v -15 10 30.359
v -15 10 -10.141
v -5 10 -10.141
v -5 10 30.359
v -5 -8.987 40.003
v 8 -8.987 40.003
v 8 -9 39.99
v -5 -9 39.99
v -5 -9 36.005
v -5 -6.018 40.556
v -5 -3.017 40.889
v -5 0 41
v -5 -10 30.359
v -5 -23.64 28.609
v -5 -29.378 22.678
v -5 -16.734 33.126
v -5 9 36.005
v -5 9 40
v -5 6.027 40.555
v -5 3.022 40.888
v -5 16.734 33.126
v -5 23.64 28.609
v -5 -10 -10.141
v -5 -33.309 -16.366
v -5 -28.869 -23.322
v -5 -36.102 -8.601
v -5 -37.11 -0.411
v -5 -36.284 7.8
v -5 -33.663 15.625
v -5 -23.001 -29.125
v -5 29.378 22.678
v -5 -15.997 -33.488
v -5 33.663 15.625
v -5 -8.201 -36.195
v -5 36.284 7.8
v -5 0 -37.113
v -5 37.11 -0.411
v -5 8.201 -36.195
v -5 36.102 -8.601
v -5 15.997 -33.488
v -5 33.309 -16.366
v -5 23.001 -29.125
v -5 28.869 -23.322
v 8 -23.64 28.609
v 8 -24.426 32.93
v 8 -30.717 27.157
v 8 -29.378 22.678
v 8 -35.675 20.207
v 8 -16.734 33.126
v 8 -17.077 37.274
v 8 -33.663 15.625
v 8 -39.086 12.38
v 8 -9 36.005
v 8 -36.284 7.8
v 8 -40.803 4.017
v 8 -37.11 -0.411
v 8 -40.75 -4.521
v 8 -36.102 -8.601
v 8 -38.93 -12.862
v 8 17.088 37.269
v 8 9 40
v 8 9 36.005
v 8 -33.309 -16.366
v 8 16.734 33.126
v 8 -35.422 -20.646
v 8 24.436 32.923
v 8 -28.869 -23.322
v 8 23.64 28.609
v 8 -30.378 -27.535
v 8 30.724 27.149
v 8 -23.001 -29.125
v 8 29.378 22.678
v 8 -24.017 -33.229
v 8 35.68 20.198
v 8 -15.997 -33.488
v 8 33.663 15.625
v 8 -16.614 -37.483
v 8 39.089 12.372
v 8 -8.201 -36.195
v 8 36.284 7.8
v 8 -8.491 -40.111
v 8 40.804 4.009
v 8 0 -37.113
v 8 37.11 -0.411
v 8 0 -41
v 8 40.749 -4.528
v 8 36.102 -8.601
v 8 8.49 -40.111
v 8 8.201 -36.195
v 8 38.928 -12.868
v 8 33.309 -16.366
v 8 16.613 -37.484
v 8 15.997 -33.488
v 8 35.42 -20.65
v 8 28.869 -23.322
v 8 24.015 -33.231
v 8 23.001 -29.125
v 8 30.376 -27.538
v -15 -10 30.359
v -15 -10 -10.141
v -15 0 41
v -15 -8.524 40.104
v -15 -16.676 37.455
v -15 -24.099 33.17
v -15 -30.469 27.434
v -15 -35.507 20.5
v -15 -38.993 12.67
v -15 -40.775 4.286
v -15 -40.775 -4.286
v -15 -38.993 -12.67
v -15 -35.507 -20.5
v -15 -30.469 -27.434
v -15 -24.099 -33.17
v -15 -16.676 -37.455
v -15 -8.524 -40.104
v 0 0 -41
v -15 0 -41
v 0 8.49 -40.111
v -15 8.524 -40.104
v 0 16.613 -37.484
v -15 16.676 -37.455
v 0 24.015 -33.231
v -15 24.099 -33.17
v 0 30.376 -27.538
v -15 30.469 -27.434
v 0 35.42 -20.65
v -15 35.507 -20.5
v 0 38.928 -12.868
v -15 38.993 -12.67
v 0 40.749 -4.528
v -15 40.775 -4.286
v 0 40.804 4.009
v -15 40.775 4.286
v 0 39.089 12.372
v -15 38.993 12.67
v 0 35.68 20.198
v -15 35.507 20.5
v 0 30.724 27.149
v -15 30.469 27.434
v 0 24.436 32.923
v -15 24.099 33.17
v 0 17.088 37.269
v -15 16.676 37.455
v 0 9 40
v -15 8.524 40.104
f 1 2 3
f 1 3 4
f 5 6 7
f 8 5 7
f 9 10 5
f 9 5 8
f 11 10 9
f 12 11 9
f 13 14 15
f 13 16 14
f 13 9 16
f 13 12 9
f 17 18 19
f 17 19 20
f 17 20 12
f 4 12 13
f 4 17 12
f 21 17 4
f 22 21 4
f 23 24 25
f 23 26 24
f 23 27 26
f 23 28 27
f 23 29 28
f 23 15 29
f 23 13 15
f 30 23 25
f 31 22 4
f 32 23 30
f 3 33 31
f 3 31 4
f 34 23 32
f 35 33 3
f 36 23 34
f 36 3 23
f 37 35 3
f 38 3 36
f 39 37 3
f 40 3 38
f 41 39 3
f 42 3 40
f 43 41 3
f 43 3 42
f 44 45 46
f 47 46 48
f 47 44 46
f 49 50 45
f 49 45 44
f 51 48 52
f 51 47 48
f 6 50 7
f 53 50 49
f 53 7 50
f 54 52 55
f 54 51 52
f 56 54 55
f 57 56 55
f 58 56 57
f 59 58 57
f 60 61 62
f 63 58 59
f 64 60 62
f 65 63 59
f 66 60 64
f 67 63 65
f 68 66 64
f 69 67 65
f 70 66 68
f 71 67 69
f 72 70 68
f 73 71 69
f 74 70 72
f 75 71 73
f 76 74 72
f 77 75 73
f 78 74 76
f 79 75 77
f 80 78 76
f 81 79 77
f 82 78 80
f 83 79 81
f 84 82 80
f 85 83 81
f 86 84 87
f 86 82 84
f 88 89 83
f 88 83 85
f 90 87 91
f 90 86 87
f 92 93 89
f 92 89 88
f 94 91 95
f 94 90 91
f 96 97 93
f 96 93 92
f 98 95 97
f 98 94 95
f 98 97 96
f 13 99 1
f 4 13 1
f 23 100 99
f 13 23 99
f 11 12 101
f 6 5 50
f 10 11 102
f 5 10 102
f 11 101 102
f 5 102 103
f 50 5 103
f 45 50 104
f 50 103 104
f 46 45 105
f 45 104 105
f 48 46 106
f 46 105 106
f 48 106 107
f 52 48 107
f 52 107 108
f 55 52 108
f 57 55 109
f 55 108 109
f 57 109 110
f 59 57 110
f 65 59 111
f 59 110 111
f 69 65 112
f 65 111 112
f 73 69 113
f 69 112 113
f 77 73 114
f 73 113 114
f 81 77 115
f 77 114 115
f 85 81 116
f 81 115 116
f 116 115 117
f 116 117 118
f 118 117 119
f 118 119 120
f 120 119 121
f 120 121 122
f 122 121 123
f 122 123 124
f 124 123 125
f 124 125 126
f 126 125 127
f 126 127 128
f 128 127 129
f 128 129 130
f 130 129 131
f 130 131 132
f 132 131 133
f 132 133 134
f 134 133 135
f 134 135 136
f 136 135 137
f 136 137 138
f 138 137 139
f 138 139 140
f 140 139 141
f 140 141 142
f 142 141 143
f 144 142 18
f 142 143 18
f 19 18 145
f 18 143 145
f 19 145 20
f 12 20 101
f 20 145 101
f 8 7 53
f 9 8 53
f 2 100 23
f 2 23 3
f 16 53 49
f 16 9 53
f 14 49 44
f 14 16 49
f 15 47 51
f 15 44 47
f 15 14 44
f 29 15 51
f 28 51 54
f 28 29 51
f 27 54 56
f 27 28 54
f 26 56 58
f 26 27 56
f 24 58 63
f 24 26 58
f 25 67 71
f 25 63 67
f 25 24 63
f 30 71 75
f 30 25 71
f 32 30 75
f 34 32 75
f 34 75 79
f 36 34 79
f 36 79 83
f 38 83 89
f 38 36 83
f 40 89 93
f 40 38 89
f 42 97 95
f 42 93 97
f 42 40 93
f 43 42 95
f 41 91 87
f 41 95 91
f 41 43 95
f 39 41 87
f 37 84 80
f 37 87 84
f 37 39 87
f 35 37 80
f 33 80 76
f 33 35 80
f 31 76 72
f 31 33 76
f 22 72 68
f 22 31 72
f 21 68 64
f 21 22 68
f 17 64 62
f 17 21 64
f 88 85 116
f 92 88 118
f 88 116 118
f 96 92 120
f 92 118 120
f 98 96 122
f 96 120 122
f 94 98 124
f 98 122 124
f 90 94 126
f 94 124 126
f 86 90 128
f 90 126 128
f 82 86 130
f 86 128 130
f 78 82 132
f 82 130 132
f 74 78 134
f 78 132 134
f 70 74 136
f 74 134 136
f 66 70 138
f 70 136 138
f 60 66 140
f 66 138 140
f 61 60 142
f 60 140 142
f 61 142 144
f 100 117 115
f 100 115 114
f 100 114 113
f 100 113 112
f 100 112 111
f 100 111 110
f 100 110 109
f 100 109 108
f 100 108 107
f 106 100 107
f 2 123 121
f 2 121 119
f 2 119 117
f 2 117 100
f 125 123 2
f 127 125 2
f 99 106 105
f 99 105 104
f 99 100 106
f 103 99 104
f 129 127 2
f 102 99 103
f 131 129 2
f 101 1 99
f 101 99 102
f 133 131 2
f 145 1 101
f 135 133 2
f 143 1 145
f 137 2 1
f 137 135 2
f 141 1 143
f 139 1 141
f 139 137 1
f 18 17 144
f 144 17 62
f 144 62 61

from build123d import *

# Parameters (mm, degrees)
CROQUIS1_R              = 41
CROQUIS1_R_2            = 37.1125
SALIENTE_EXTRUIR1_DEPTH = 10
CROQUIS2_R              = 41
SALIENTE_EXTRUIR2_DEPTH = 10
CROQUIS3_R              = 29.25
CROQUIS3_R_2            = 23.25
CORTAR_EXTRUIR3_DEPTH   = 5
CROQUIS6_R              = 41
SALIENTE_EXTRUIR4_DEPTH = 5
CROQUIS8_R              = 41
CROQUIS8_R_2            = 34.6125
SALIENTE_EXTRUIR9_DEPTH = 2
CROQUIS10_W             = 40.5
CROQUIS10_H             = 20
CORTAR_EXTRUIR5_DEPTH   = 25
CROQUIS11_R             = 41
CROQUIS11_R_2           = 34.6125
CORTAR_EXTRUIR7_DEPTH   = 2
CROQUIS16_R             = 37.1125
CROQUIS16_R_2           = 29.25
CROQUIS16_R_3           = 23.25
CROQUIS16_R_4           = 0.131738941
CORTAR_EXTRUIR8_DEPTH   = 5
CORTAR_EXTRUIR11_DEPTH  = 13


with BuildPart() as part:
    # Croquis1 → Saliente-Extruir1 (new body)
    with BuildSketch(Plane(origin=(0, 0, 0), x_dir=(0, 0, -1), z_dir=(1, 0, 0))):
        Circle(CROQUIS1_R)
        Circle(CROQUIS1_R_2, mode=Mode.SUBTRACT)
    extrude(amount=SALIENTE_EXTRUIR1_DEPTH)

    # Croquis2 → Saliente-Extruir2 (add)
    with BuildSketch(Plane.ZY):
        Circle(CROQUIS2_R)
    extrude(amount=SALIENTE_EXTRUIR2_DEPTH)

    # Croquis3 → Cortar-Extruir3 (cut)
    with BuildSketch(Plane(origin=(0, 0, 0), x_dir=(0, 0, -1), z_dir=(1, 0, 0))):
        Circle(CROQUIS3_R)
        Circle(CROQUIS3_R_2, mode=Mode.SUBTRACT)
    extrude(amount=-CORTAR_EXTRUIR3_DEPTH, mode=Mode.SUBTRACT)

    # Croquis6 → Saliente-Extruir4 (add)
    with BuildSketch(Plane.ZY.offset(10)):
        Circle(CROQUIS6_R)
    extrude(amount=SALIENTE_EXTRUIR4_DEPTH)

    # Croquis8 → Saliente-Extruir9 (add)
    with BuildSketch(Plane(origin=(10, 0, 0), x_dir=(0, 0, -1), z_dir=(1, 0, 0))):
        Circle(CROQUIS8_R)
        Circle(CROQUIS8_R_2, mode=Mode.SUBTRACT)
    extrude(amount=-SALIENTE_EXTRUIR9_DEPTH)

    # Croquis10 → Cortar-Extruir5 (cut)
    with BuildSketch(Plane.ZY.offset(15)):
        with Locations((10.108898944, 0)):
            Rectangle(CROQUIS10_W, CROQUIS10_H)
    extrude(amount=-CORTAR_EXTRUIR5_DEPTH, mode=Mode.SUBTRACT)

    # Croquis11 → Cortar-Extruir7 (cut)
    with BuildSketch(Plane(origin=(10, 0, 0), x_dir=(0, 0, -1), z_dir=(1, 0, 0))):
        Circle(CROQUIS11_R)
        Circle(CROQUIS11_R_2, mode=Mode.SUBTRACT)
    extrude(amount=-CORTAR_EXTRUIR7_DEPTH, mode=Mode.SUBTRACT)

    # Croquis16 → Cortar-Extruir8 (cut)
    with BuildSketch(Plane(origin=(0, 0, 0), x_dir=(0, 0, -1), z_dir=(1, 0, 0))):
        Circle(CROQUIS16_R)
        Circle(CROQUIS16_R_2, mode=Mode.SUBTRACT)
        Circle(CROQUIS16_R_3)
        with Locations((-25.248825272, -14.504135598)):
            Circle(CROQUIS16_R_4)
    extrude(amount=-CORTAR_EXTRUIR8_DEPTH, mode=Mode.SUBTRACT)

    # Croquis17 → Cortar-Extruir11 (cut)
    with BuildSketch(Plane(origin=(8, 0, 0), x_dir=(0, 0, -1), z_dir=(1, 0, 0))):
        with BuildLine():
            Line((-52.12049427, 3.696100056), (-40.002976192, -8.986762253))
            ThreePointArc((-40.002976192, -8.986762253), (-40.999999439, 0.006784093), (-40, 9))
            Line((-40, 9), (-52.12049427, 3.696100056))
        make_face()
        with BuildLine():
            ThreePointArc((-36.004689365, 9), (-37.1125, 0), (-36.004689365, -9))
            Line((-36.004689365, -9), (-30.358898944, -9))
            Line((-30.358898944, -9), (-30.358898944, 9))
            Line((-30.358898944, 9), (-36.004689365, 9))
        make_face()
        with BuildLine():
            Line((-30.358898944, -9), (-36.004689365, -9))
            ThreePointArc((-36.004689365, -9), (4.533961965, -36.834506175), (37.1125, 0))
            ThreePointArc((37.1125, 0), (4.533961965, 36.834506175), (-36.004689365, 9))
            Line((-36.004689365, 9), (-30.358898944, 9))
            Line((-30.358898944, 9), (-30.358898944, -9))
        make_face()
        with BuildLine():
            Line((-40.002976192, -8.986762253), (-39.990328523, -9))
            Line((-39.990328523, -9), (-36.004689365, -9))
            ThreePointArc((-36.004689365, -9), (-37.1125, 0), (-36.004689365, 9))
            Line((-36.004689365, 9), (-40, 9))
            ThreePointArc((-40, 9), (-40.999999439, 0.006784093), (-40.002976192, -8.986762253))
        make_face()
    extrude(amount=-CORTAR_EXTRUIR11_DEPTH, mode=Mode.SUBTRACT)


solid = part.part
